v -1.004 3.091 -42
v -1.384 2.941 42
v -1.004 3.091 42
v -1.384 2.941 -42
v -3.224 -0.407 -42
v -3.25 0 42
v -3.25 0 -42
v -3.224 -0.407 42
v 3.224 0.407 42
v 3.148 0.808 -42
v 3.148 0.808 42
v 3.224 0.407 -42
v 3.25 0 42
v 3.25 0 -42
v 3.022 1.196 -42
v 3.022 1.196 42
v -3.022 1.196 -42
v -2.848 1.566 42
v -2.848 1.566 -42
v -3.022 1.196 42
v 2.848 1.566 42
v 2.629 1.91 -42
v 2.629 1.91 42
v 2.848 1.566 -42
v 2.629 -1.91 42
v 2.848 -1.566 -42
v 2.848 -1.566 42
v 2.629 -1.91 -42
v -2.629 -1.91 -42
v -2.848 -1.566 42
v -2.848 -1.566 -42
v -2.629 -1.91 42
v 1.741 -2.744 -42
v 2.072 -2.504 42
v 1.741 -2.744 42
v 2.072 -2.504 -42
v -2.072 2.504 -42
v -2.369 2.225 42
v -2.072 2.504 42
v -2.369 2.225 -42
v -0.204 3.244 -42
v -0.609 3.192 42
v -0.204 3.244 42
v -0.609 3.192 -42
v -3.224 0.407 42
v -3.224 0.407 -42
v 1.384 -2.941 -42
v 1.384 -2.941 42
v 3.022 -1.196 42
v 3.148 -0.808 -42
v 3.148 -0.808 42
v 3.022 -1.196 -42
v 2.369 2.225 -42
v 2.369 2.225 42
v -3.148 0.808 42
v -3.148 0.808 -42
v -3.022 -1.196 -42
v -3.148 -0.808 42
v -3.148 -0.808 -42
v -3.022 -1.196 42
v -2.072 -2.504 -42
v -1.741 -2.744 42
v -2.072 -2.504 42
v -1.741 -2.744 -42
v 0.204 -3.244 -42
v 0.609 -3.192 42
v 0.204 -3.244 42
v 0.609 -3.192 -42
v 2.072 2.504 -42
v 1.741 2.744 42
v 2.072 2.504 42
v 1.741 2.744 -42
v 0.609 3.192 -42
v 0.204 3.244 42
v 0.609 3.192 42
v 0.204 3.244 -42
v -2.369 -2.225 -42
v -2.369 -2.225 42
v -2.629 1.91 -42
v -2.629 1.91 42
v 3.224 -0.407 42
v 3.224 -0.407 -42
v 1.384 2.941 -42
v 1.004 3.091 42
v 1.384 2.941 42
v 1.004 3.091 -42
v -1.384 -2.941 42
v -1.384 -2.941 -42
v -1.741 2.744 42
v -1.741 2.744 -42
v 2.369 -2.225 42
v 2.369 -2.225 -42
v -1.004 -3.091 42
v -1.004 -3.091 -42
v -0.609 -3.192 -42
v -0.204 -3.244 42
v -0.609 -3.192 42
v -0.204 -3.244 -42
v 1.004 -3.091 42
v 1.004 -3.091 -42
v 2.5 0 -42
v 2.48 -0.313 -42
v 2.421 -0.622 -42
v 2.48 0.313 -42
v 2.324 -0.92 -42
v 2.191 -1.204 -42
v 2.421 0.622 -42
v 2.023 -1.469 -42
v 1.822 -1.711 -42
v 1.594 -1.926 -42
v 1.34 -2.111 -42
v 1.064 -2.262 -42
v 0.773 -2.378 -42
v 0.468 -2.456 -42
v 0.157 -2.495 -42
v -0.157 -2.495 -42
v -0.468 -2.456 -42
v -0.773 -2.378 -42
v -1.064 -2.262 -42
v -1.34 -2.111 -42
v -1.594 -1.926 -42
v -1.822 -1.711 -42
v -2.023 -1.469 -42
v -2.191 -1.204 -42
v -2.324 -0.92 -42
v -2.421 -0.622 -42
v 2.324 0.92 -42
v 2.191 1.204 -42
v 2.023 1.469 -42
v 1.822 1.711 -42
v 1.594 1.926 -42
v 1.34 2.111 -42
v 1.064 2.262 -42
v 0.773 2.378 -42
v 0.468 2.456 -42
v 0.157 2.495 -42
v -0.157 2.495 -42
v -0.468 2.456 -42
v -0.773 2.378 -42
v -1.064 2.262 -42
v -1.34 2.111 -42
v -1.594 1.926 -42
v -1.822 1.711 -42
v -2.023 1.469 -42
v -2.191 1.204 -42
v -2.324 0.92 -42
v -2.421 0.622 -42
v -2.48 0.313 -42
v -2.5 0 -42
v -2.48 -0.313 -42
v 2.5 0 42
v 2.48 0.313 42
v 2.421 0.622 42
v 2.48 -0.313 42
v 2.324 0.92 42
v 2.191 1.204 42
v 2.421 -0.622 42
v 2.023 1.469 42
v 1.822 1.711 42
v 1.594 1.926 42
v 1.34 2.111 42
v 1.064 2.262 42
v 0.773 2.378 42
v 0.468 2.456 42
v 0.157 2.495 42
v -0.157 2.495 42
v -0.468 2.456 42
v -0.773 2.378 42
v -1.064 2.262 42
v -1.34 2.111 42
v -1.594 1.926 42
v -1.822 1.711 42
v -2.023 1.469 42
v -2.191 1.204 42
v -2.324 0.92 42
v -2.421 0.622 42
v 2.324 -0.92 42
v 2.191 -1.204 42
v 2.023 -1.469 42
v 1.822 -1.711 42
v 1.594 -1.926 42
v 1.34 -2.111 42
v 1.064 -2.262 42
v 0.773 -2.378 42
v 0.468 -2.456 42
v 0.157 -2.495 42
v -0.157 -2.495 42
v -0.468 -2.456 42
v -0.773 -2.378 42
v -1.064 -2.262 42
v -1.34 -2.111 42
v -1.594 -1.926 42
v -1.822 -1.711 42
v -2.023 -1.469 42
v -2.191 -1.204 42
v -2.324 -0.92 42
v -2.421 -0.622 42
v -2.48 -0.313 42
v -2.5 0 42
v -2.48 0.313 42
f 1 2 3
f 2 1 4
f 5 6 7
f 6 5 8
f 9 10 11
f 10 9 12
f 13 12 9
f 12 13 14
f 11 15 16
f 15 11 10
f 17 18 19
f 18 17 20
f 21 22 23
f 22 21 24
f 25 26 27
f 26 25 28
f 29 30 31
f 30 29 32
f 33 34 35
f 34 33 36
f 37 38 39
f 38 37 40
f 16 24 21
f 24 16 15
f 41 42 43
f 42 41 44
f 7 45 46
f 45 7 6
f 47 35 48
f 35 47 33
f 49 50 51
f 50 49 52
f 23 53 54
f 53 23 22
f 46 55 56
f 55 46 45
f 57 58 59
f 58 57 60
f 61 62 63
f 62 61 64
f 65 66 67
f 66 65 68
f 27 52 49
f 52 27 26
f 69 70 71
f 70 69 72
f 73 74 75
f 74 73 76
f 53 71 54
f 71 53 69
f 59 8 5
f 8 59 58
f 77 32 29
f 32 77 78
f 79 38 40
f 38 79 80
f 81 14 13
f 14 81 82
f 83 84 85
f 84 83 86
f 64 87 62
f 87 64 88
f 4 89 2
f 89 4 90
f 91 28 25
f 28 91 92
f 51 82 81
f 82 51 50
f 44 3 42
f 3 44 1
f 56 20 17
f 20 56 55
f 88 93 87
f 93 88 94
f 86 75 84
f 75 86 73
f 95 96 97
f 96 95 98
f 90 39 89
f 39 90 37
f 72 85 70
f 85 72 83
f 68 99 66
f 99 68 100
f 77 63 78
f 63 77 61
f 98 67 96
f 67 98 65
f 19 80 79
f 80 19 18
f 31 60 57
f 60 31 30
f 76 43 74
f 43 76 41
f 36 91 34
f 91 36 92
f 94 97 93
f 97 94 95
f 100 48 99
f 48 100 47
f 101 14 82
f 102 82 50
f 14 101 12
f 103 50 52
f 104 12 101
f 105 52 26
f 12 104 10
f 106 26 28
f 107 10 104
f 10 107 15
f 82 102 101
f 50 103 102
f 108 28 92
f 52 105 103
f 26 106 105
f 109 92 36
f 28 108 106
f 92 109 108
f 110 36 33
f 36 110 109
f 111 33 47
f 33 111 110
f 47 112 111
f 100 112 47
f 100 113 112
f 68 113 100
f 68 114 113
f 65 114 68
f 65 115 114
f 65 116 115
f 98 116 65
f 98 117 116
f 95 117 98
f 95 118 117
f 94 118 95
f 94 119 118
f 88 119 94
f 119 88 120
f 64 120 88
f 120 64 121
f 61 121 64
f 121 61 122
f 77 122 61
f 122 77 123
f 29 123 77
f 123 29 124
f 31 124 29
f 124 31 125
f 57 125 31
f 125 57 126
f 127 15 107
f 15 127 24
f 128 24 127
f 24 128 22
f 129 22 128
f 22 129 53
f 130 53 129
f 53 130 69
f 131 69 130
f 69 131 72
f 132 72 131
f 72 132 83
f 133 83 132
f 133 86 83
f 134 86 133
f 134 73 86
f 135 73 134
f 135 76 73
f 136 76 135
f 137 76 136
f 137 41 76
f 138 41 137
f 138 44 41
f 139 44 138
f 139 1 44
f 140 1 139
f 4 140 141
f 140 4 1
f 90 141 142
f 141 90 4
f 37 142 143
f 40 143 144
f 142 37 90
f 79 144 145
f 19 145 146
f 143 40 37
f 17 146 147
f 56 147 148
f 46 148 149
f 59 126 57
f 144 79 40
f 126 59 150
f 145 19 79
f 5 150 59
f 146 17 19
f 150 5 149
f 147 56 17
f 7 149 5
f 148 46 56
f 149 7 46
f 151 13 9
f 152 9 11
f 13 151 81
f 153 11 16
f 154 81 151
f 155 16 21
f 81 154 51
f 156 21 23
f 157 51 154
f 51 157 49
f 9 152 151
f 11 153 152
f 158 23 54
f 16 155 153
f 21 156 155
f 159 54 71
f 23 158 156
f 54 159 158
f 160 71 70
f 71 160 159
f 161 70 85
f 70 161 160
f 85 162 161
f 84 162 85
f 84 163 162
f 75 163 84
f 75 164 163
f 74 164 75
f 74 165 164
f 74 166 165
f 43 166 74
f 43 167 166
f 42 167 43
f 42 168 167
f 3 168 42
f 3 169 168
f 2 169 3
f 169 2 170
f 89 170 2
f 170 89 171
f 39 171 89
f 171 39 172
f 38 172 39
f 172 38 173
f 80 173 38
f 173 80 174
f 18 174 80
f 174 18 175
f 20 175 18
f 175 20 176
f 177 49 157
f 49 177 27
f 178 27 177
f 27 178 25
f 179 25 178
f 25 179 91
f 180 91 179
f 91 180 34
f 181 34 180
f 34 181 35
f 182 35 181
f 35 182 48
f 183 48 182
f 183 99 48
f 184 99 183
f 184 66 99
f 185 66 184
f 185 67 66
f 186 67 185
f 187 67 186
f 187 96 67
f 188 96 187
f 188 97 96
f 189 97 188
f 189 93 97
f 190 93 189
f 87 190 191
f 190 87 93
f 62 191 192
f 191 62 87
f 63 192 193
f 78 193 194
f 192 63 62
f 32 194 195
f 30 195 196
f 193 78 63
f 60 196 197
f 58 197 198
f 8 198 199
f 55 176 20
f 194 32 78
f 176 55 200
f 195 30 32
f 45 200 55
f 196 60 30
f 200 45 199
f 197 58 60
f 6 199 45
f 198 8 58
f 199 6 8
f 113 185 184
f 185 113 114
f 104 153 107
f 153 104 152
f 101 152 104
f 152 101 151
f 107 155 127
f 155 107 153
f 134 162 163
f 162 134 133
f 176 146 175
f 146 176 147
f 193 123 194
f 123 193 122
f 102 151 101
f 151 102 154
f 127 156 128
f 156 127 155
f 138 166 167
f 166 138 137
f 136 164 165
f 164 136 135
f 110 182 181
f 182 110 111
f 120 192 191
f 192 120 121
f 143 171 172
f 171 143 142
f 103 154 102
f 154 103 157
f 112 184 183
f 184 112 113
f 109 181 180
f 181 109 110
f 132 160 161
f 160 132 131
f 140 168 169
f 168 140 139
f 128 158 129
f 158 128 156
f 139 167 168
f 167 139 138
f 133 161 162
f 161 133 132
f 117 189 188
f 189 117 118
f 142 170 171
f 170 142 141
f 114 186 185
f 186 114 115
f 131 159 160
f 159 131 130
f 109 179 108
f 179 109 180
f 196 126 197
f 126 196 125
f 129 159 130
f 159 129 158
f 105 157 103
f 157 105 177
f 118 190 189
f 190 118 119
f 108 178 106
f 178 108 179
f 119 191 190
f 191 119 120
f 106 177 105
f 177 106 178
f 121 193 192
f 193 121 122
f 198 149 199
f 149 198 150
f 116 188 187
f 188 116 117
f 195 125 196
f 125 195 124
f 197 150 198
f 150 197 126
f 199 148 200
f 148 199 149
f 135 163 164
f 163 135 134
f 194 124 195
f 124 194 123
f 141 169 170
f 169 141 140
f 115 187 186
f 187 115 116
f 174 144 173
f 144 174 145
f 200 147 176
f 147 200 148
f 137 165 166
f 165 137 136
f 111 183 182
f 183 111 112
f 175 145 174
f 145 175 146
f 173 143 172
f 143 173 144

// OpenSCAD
$fn = 50;


difference() {
	union() {
		translate(v = [0, 0, -42.0000000000]) {
			cylinder(h = 84, r = 3.2500000000);
		}
	}
	union() {
		translate(v = [0, 0, -100.0000000000]) {
			cylinder(h = 200, r = 2.5000000000);
		}
	}
}
